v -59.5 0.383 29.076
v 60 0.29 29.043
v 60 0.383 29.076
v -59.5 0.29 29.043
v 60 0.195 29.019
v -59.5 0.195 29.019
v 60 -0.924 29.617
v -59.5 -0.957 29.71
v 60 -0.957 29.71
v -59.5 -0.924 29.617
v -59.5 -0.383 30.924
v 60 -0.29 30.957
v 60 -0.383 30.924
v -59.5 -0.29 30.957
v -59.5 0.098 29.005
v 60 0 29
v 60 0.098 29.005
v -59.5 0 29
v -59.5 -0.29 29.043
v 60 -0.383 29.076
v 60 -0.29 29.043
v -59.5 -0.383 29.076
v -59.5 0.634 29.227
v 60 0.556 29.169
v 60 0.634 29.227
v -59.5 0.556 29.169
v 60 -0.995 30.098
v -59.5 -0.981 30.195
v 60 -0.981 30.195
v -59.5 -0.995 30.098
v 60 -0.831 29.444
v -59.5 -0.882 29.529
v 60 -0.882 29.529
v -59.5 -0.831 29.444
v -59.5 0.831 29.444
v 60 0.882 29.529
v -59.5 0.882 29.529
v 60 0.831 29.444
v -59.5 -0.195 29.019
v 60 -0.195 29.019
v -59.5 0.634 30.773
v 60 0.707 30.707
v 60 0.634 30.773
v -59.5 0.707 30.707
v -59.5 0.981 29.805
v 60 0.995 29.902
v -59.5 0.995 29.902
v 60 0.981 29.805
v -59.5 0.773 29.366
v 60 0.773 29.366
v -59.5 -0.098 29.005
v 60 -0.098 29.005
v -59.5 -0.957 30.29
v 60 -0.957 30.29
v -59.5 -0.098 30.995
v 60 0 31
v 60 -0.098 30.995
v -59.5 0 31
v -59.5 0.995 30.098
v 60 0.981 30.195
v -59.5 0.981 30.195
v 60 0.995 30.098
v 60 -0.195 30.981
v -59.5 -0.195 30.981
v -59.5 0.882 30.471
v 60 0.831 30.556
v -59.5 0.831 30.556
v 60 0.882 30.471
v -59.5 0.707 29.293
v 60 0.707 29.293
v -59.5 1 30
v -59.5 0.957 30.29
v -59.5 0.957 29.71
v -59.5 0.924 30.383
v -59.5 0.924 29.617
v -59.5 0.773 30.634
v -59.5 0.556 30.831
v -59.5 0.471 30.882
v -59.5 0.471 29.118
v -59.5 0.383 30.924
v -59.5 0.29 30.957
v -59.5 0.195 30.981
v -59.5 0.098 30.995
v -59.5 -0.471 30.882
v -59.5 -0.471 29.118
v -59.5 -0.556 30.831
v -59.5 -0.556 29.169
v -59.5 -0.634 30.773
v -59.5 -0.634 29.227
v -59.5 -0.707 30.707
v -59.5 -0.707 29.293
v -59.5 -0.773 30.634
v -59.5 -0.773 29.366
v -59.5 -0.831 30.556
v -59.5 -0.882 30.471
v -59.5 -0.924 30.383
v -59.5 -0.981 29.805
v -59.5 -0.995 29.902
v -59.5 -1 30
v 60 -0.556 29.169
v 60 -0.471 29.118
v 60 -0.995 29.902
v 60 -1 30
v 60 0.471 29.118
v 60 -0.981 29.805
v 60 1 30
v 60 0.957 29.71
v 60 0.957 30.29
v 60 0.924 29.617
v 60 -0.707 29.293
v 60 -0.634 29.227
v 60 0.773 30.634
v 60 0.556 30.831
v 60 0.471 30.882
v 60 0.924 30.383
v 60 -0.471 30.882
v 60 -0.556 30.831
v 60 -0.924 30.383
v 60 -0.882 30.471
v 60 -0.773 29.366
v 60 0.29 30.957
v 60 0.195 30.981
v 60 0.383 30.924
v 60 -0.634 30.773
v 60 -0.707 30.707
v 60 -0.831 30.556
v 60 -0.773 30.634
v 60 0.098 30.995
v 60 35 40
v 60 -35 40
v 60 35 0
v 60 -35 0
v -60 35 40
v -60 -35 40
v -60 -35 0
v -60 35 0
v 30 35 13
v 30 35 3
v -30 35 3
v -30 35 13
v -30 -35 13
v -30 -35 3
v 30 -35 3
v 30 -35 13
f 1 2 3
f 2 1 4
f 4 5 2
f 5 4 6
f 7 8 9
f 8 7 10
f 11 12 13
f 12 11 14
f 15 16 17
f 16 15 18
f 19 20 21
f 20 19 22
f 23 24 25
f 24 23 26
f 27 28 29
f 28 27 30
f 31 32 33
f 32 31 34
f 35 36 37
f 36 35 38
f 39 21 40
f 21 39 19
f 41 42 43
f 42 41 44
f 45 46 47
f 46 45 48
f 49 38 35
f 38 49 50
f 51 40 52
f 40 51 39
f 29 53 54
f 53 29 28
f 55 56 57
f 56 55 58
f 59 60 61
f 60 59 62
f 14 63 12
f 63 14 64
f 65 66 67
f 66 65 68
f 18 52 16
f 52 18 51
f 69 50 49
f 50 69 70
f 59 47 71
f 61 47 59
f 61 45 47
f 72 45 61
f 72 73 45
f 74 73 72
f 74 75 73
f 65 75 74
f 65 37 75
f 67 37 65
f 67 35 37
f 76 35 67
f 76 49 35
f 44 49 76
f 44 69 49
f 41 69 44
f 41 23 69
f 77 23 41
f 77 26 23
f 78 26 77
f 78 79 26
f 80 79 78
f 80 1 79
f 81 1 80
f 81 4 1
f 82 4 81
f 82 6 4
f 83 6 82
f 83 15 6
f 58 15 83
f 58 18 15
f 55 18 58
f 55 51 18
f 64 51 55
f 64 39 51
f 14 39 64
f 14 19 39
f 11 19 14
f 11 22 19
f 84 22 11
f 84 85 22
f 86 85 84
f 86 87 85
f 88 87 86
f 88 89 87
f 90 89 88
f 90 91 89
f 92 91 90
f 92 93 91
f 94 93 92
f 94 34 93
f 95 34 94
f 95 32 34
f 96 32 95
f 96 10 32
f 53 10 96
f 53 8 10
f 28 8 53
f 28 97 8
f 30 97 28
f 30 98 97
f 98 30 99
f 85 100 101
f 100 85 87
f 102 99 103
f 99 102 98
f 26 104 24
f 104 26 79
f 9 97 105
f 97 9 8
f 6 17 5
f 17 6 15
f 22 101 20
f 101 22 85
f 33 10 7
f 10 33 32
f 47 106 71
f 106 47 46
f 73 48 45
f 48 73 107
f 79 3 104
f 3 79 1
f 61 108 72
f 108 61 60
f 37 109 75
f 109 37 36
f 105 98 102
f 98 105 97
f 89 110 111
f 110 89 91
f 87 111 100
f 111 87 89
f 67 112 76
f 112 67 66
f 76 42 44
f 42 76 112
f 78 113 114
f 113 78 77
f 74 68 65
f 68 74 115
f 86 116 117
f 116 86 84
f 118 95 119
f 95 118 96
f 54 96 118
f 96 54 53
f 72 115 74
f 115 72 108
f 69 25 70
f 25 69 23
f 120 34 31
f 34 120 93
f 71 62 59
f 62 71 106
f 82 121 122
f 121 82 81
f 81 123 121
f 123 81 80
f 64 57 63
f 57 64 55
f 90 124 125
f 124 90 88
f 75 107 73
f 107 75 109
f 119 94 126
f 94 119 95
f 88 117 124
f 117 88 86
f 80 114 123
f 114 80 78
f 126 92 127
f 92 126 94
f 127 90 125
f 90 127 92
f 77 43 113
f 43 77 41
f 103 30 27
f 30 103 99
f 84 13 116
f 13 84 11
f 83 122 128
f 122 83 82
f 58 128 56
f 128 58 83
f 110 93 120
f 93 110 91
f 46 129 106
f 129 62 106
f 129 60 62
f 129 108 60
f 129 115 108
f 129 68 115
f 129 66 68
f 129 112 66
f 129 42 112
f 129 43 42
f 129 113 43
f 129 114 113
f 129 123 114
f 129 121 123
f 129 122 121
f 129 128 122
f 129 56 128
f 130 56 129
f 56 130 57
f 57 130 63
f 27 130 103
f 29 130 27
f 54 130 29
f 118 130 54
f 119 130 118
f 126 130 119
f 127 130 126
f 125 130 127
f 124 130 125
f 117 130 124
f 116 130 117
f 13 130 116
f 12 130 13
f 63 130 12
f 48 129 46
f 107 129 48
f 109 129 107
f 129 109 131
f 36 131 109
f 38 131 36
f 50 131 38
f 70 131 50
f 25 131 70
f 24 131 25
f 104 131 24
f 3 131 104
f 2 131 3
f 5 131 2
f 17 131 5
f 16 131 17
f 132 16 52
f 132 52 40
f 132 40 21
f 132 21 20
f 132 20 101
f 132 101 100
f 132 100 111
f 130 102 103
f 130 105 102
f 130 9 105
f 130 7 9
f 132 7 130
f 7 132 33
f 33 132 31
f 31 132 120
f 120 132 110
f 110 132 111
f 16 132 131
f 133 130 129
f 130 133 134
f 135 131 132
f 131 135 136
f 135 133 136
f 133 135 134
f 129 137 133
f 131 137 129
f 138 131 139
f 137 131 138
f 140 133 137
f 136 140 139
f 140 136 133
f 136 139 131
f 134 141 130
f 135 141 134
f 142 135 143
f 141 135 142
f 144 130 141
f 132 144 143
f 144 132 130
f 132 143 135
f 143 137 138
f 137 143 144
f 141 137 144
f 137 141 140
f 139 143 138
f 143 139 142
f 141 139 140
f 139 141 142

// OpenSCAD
// Mini horizontal gel-electrophoresis buffer tank
// Print orientation: open top facing up, resting on XY plane at z = 0

// ---------------- Parameters ----------------
tank_x      = 120;   // outer length along X (mm)
tank_y      = 70;    // outer width along Y (mm)
tank_h      = 40;    // outer height along Z (mm)

wall        = 3;     // wall thickness (mm)
floor       = 3;     // floor thickness under chambers (mm)

platform_x  = 60;    // platform length along X (mm), centred
platform_y  = tank_y; // platform spans full inner width (mm)
platform_top = 13;   // platform top height above tank floor (mm)

hole_d      = 2;     // electrode hole diameter (mm)
hole_y      = 0;     // electrode hole Y position (mm)
hole_z      = 30;    // electrode hole Z position (mm)

eps         = 0.5;   // cutter overshoot past faces (mm)

$fn = 64;

// ---------------- Derived ----------------
inner_x = tank_x - 2 * wall;   // inner floor length along X
inner_y = tank_y - 2 * wall;   // inner width along Y
floor_t = floor;               // floor thickness under chambers
plat_t  = platform_top - floor_t; // platform thickness above floor

// ---------------- Model ----------------
difference() {
    // Main tank body (open top)
    translate([-tank_x / 2, -tank_y / 2, 0])
        cube([tank_x, tank_y, tank_h]);

    // Central raised platform for gel tray
    translate([-platform_x / 2, -platform_y / 2, floor_t])
        cube([platform_x, platform_y, plat_t]);

    // Horizontal electrode holes through each end wall along X
    for (s = [-1, 1])
        translate([s * (tank_x / 2 - eps), hole_y, hole_z])
            rotate([0, 90, 0])
                cylinder(d = hole_d, h = tank_x + 2 * eps);
}
